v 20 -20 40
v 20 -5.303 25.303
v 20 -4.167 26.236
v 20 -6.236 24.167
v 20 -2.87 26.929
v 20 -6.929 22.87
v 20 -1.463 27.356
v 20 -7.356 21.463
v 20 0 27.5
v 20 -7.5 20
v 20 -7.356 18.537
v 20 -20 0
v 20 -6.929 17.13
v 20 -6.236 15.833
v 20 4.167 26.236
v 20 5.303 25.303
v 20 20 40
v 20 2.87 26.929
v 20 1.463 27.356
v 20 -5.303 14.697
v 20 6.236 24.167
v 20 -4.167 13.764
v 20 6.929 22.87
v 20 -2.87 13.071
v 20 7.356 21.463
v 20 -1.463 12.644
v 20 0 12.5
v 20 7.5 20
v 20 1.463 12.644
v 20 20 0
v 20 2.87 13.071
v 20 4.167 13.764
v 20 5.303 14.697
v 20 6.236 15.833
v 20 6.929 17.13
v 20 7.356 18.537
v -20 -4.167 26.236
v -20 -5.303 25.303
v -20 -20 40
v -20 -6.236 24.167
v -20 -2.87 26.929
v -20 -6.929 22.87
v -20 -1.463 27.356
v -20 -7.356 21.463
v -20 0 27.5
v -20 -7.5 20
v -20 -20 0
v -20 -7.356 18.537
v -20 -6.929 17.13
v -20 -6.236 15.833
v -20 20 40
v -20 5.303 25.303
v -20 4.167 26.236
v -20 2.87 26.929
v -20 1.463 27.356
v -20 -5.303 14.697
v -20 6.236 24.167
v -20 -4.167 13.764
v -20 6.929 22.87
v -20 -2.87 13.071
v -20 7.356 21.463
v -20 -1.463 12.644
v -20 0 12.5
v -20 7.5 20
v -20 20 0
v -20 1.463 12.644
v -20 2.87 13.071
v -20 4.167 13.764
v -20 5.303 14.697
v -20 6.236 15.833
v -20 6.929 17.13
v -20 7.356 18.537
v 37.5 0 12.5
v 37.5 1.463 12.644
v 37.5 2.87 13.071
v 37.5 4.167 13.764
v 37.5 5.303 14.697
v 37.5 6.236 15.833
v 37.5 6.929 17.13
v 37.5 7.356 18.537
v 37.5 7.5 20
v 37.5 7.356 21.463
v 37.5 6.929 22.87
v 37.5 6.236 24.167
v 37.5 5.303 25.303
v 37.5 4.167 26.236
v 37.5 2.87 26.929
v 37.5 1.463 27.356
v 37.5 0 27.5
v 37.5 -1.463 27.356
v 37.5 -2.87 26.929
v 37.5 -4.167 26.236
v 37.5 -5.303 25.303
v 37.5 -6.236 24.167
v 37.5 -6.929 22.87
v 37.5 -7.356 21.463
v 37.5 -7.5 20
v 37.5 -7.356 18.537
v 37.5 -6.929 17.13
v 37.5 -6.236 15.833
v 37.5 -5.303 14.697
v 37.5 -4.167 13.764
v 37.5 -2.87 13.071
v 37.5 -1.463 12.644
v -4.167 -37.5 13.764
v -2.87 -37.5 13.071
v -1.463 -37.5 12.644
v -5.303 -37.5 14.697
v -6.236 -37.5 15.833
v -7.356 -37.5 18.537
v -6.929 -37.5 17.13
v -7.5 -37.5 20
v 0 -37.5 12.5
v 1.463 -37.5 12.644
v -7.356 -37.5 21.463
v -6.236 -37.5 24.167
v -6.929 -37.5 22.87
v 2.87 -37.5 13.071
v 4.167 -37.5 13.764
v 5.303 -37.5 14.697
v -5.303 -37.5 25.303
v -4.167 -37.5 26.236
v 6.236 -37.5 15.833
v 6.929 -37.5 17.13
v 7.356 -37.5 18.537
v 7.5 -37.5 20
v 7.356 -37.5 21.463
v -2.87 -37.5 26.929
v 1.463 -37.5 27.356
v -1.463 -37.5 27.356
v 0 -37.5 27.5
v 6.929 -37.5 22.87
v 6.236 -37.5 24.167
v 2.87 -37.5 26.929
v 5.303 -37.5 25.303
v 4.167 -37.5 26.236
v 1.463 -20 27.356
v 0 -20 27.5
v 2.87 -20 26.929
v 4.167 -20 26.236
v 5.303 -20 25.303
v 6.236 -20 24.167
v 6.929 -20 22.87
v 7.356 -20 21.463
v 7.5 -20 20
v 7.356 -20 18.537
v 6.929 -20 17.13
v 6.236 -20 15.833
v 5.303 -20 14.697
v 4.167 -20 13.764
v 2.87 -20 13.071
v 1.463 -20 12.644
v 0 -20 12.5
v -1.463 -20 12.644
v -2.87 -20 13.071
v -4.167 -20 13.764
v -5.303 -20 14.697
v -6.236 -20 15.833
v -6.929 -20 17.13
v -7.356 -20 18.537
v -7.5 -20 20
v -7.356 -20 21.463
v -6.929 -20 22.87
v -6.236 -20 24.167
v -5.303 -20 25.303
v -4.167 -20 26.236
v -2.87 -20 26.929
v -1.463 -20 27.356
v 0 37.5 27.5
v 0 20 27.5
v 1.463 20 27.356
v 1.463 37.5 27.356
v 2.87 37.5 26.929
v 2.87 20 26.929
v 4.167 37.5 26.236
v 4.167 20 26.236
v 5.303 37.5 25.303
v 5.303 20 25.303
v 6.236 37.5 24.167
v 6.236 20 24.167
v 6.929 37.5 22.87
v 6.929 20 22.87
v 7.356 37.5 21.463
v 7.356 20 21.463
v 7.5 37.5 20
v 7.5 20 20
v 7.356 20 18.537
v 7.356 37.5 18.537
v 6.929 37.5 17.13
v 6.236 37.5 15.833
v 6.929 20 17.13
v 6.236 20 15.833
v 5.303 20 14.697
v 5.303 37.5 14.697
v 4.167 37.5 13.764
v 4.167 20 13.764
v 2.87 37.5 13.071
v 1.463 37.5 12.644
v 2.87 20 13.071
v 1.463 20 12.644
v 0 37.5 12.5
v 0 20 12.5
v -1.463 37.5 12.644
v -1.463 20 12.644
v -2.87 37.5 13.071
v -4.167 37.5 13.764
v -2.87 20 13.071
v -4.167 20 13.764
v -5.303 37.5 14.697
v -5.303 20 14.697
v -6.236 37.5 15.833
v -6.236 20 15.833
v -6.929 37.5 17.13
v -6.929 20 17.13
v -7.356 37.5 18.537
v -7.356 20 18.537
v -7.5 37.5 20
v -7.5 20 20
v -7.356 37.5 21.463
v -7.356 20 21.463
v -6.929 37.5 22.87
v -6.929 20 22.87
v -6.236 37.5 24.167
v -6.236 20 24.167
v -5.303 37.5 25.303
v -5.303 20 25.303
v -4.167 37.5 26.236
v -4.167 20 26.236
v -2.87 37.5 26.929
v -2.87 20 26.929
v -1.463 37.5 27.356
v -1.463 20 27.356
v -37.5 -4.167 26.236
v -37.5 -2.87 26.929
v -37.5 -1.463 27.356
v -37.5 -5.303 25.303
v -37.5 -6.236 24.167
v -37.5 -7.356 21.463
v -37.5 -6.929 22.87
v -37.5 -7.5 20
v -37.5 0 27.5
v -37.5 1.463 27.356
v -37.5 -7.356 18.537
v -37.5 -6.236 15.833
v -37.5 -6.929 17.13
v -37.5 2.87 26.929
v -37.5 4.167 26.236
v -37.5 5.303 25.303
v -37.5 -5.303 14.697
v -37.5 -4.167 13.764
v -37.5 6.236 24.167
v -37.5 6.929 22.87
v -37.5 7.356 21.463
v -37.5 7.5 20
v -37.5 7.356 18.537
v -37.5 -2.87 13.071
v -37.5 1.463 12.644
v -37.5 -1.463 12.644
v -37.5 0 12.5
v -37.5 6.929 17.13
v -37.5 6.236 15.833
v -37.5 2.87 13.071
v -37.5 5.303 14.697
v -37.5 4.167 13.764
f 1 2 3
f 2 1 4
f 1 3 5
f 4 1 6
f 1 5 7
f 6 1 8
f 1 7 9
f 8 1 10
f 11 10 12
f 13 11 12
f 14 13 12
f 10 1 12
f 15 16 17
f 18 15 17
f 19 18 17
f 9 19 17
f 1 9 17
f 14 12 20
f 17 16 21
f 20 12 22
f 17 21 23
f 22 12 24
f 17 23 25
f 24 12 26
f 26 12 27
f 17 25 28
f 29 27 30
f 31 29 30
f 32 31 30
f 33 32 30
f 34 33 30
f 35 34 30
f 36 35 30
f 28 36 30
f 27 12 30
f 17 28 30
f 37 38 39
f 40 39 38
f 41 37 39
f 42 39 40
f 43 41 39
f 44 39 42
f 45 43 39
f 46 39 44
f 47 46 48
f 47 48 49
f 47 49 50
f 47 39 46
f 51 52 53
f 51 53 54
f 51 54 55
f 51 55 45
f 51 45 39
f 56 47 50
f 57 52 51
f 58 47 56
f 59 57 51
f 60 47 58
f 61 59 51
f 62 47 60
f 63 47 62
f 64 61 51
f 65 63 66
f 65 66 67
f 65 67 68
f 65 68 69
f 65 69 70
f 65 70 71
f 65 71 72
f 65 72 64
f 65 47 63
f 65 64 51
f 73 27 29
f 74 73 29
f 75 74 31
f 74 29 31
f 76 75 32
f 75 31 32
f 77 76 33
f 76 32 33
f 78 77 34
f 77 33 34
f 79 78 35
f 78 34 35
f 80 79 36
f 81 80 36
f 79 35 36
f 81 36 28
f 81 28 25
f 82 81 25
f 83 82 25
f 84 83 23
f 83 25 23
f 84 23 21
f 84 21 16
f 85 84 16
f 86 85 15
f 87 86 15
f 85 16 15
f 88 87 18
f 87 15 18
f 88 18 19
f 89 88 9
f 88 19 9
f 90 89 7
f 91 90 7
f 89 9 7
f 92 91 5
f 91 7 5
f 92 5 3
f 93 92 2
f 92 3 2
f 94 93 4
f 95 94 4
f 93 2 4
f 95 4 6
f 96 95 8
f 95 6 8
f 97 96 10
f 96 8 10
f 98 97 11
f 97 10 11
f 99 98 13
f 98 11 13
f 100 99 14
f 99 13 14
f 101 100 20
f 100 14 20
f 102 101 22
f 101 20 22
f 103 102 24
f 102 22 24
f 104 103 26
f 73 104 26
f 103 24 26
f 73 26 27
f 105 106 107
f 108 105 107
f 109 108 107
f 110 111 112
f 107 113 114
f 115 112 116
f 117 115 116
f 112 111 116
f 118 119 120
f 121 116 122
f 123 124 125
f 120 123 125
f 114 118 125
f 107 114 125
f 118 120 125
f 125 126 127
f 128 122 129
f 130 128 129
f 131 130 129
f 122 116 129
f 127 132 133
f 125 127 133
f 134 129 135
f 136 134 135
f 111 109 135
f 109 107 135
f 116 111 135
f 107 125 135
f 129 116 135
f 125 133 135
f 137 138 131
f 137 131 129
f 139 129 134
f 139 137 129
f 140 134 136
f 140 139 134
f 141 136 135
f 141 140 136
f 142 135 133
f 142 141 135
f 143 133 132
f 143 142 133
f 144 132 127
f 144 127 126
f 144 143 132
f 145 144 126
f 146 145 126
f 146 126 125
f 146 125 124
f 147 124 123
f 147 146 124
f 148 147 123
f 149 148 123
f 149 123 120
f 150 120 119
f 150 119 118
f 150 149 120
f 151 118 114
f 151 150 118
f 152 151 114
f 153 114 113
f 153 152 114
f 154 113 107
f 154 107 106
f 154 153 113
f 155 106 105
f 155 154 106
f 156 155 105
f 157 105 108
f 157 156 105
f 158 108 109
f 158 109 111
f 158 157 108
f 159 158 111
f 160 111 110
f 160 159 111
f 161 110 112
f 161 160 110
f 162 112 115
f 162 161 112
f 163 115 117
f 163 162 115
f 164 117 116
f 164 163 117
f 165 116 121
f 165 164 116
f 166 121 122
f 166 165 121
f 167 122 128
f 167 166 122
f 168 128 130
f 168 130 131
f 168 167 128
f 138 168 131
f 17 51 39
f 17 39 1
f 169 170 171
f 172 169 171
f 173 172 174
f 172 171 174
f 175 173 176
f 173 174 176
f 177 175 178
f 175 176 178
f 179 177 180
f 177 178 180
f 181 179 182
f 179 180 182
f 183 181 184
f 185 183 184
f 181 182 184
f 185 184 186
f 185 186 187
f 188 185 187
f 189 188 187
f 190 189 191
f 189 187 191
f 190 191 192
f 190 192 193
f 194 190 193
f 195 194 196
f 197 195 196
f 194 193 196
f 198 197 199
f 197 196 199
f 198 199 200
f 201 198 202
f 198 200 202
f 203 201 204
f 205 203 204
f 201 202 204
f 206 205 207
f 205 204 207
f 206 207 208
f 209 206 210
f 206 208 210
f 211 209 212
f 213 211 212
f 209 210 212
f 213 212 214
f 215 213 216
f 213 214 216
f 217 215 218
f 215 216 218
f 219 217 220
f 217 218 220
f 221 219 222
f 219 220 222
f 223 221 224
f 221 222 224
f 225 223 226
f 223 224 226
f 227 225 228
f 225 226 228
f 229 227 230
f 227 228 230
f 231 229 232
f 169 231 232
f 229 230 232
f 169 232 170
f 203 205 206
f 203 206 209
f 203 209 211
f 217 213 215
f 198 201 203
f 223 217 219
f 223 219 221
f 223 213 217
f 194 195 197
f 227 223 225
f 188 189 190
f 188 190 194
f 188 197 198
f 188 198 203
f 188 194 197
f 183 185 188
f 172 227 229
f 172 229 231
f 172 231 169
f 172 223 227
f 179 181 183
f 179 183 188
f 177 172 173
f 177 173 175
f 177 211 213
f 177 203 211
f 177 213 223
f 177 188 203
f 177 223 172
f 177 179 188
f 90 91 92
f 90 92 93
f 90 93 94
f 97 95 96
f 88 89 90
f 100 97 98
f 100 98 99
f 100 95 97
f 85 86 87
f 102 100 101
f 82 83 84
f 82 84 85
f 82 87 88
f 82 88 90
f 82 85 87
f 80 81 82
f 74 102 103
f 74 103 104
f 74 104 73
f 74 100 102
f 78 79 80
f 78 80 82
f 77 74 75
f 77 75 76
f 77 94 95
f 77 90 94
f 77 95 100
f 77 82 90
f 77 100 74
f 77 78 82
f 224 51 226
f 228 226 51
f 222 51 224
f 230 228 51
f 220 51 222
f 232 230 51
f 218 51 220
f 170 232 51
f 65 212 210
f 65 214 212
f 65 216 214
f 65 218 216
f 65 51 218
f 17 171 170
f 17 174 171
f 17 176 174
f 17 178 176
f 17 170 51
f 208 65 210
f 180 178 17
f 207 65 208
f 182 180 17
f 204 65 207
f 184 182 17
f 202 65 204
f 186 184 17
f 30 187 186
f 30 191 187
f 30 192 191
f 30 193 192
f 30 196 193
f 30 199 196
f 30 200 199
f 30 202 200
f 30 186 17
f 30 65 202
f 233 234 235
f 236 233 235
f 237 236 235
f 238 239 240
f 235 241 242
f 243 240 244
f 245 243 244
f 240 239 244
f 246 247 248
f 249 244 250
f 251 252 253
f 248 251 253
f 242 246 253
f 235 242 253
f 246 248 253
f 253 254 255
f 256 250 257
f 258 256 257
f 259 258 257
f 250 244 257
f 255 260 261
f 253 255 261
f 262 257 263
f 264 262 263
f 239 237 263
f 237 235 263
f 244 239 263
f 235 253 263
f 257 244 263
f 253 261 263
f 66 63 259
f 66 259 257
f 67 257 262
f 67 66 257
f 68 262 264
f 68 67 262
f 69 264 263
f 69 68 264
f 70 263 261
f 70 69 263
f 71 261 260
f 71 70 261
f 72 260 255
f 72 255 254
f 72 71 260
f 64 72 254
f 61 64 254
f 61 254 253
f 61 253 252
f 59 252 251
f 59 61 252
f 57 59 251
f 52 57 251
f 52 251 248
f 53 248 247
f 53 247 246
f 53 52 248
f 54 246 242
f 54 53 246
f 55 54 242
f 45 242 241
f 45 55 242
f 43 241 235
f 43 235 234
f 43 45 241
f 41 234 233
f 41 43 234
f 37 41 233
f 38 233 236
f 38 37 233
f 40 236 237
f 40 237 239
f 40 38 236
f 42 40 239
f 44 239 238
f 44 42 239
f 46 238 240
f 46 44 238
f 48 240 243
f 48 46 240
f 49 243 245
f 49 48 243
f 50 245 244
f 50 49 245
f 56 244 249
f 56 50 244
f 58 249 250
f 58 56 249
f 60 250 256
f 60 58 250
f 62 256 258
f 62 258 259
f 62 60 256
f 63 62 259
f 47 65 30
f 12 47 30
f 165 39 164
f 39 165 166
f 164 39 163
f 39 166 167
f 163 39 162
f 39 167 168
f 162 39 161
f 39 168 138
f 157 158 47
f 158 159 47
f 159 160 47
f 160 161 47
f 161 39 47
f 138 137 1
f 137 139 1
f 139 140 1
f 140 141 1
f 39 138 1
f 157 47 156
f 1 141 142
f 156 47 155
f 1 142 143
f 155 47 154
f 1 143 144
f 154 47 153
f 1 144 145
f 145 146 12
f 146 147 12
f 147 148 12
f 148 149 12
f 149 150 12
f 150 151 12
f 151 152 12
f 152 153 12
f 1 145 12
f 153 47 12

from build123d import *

# Parameters (mm, degrees)
SKETCH1_W           = 40
SKETCH1_H           = 40
BOSS_EXTRUDE1_DEPTH = 40
SKETCH2_R           = 7.5
BOSS_EXTRUDE2_DEPTH = 17.5
SKETCH3_R           = 7.5
BOSS_EXTRUDE3_DEPTH = 17.5


with BuildPart() as part:
    # Sketch1 → Boss-Extrude1 (new body)
    with BuildSketch(Plane.XY):
        Rectangle(SKETCH1_W, SKETCH1_H)
    extrude(amount=BOSS_EXTRUDE1_DEPTH)

    # Sketch2 → Boss-Extrude2 (add)
    with BuildSketch(Plane(origin=(0, 20, 0), x_dir=(1, 0, 0), z_dir=(0, 1, 0))):
        with Locations(Location((0, -20, 0), (0, 0, 270))):
            Circle(SKETCH2_R)
    boss_extrude2 = extrude(amount=BOSS_EXTRUDE2_DEPTH)

    # Mirror1: Boss-Extrude2 across plane
    add(boss_extrude2.mirror(Plane.ZX))

    # Sketch3 → Boss-Extrude3 (add)
    with BuildSketch(Plane(origin=(20, 0, 0), x_dir=(0, 0, -1), z_dir=(1, 0, 0))):
        with Locations((-20, 0)):
            Circle(SKETCH3_R)
    boss_extrude3 = extrude(amount=BOSS_EXTRUDE3_DEPTH)

    # Mirror2: Boss-Extrude3 across plane
    add(boss_extrude3.mirror(Plane(origin=(0, 0, 0), x_dir=(0, 0, 1), z_dir=(1, 0, 0))))


solid = part.part
